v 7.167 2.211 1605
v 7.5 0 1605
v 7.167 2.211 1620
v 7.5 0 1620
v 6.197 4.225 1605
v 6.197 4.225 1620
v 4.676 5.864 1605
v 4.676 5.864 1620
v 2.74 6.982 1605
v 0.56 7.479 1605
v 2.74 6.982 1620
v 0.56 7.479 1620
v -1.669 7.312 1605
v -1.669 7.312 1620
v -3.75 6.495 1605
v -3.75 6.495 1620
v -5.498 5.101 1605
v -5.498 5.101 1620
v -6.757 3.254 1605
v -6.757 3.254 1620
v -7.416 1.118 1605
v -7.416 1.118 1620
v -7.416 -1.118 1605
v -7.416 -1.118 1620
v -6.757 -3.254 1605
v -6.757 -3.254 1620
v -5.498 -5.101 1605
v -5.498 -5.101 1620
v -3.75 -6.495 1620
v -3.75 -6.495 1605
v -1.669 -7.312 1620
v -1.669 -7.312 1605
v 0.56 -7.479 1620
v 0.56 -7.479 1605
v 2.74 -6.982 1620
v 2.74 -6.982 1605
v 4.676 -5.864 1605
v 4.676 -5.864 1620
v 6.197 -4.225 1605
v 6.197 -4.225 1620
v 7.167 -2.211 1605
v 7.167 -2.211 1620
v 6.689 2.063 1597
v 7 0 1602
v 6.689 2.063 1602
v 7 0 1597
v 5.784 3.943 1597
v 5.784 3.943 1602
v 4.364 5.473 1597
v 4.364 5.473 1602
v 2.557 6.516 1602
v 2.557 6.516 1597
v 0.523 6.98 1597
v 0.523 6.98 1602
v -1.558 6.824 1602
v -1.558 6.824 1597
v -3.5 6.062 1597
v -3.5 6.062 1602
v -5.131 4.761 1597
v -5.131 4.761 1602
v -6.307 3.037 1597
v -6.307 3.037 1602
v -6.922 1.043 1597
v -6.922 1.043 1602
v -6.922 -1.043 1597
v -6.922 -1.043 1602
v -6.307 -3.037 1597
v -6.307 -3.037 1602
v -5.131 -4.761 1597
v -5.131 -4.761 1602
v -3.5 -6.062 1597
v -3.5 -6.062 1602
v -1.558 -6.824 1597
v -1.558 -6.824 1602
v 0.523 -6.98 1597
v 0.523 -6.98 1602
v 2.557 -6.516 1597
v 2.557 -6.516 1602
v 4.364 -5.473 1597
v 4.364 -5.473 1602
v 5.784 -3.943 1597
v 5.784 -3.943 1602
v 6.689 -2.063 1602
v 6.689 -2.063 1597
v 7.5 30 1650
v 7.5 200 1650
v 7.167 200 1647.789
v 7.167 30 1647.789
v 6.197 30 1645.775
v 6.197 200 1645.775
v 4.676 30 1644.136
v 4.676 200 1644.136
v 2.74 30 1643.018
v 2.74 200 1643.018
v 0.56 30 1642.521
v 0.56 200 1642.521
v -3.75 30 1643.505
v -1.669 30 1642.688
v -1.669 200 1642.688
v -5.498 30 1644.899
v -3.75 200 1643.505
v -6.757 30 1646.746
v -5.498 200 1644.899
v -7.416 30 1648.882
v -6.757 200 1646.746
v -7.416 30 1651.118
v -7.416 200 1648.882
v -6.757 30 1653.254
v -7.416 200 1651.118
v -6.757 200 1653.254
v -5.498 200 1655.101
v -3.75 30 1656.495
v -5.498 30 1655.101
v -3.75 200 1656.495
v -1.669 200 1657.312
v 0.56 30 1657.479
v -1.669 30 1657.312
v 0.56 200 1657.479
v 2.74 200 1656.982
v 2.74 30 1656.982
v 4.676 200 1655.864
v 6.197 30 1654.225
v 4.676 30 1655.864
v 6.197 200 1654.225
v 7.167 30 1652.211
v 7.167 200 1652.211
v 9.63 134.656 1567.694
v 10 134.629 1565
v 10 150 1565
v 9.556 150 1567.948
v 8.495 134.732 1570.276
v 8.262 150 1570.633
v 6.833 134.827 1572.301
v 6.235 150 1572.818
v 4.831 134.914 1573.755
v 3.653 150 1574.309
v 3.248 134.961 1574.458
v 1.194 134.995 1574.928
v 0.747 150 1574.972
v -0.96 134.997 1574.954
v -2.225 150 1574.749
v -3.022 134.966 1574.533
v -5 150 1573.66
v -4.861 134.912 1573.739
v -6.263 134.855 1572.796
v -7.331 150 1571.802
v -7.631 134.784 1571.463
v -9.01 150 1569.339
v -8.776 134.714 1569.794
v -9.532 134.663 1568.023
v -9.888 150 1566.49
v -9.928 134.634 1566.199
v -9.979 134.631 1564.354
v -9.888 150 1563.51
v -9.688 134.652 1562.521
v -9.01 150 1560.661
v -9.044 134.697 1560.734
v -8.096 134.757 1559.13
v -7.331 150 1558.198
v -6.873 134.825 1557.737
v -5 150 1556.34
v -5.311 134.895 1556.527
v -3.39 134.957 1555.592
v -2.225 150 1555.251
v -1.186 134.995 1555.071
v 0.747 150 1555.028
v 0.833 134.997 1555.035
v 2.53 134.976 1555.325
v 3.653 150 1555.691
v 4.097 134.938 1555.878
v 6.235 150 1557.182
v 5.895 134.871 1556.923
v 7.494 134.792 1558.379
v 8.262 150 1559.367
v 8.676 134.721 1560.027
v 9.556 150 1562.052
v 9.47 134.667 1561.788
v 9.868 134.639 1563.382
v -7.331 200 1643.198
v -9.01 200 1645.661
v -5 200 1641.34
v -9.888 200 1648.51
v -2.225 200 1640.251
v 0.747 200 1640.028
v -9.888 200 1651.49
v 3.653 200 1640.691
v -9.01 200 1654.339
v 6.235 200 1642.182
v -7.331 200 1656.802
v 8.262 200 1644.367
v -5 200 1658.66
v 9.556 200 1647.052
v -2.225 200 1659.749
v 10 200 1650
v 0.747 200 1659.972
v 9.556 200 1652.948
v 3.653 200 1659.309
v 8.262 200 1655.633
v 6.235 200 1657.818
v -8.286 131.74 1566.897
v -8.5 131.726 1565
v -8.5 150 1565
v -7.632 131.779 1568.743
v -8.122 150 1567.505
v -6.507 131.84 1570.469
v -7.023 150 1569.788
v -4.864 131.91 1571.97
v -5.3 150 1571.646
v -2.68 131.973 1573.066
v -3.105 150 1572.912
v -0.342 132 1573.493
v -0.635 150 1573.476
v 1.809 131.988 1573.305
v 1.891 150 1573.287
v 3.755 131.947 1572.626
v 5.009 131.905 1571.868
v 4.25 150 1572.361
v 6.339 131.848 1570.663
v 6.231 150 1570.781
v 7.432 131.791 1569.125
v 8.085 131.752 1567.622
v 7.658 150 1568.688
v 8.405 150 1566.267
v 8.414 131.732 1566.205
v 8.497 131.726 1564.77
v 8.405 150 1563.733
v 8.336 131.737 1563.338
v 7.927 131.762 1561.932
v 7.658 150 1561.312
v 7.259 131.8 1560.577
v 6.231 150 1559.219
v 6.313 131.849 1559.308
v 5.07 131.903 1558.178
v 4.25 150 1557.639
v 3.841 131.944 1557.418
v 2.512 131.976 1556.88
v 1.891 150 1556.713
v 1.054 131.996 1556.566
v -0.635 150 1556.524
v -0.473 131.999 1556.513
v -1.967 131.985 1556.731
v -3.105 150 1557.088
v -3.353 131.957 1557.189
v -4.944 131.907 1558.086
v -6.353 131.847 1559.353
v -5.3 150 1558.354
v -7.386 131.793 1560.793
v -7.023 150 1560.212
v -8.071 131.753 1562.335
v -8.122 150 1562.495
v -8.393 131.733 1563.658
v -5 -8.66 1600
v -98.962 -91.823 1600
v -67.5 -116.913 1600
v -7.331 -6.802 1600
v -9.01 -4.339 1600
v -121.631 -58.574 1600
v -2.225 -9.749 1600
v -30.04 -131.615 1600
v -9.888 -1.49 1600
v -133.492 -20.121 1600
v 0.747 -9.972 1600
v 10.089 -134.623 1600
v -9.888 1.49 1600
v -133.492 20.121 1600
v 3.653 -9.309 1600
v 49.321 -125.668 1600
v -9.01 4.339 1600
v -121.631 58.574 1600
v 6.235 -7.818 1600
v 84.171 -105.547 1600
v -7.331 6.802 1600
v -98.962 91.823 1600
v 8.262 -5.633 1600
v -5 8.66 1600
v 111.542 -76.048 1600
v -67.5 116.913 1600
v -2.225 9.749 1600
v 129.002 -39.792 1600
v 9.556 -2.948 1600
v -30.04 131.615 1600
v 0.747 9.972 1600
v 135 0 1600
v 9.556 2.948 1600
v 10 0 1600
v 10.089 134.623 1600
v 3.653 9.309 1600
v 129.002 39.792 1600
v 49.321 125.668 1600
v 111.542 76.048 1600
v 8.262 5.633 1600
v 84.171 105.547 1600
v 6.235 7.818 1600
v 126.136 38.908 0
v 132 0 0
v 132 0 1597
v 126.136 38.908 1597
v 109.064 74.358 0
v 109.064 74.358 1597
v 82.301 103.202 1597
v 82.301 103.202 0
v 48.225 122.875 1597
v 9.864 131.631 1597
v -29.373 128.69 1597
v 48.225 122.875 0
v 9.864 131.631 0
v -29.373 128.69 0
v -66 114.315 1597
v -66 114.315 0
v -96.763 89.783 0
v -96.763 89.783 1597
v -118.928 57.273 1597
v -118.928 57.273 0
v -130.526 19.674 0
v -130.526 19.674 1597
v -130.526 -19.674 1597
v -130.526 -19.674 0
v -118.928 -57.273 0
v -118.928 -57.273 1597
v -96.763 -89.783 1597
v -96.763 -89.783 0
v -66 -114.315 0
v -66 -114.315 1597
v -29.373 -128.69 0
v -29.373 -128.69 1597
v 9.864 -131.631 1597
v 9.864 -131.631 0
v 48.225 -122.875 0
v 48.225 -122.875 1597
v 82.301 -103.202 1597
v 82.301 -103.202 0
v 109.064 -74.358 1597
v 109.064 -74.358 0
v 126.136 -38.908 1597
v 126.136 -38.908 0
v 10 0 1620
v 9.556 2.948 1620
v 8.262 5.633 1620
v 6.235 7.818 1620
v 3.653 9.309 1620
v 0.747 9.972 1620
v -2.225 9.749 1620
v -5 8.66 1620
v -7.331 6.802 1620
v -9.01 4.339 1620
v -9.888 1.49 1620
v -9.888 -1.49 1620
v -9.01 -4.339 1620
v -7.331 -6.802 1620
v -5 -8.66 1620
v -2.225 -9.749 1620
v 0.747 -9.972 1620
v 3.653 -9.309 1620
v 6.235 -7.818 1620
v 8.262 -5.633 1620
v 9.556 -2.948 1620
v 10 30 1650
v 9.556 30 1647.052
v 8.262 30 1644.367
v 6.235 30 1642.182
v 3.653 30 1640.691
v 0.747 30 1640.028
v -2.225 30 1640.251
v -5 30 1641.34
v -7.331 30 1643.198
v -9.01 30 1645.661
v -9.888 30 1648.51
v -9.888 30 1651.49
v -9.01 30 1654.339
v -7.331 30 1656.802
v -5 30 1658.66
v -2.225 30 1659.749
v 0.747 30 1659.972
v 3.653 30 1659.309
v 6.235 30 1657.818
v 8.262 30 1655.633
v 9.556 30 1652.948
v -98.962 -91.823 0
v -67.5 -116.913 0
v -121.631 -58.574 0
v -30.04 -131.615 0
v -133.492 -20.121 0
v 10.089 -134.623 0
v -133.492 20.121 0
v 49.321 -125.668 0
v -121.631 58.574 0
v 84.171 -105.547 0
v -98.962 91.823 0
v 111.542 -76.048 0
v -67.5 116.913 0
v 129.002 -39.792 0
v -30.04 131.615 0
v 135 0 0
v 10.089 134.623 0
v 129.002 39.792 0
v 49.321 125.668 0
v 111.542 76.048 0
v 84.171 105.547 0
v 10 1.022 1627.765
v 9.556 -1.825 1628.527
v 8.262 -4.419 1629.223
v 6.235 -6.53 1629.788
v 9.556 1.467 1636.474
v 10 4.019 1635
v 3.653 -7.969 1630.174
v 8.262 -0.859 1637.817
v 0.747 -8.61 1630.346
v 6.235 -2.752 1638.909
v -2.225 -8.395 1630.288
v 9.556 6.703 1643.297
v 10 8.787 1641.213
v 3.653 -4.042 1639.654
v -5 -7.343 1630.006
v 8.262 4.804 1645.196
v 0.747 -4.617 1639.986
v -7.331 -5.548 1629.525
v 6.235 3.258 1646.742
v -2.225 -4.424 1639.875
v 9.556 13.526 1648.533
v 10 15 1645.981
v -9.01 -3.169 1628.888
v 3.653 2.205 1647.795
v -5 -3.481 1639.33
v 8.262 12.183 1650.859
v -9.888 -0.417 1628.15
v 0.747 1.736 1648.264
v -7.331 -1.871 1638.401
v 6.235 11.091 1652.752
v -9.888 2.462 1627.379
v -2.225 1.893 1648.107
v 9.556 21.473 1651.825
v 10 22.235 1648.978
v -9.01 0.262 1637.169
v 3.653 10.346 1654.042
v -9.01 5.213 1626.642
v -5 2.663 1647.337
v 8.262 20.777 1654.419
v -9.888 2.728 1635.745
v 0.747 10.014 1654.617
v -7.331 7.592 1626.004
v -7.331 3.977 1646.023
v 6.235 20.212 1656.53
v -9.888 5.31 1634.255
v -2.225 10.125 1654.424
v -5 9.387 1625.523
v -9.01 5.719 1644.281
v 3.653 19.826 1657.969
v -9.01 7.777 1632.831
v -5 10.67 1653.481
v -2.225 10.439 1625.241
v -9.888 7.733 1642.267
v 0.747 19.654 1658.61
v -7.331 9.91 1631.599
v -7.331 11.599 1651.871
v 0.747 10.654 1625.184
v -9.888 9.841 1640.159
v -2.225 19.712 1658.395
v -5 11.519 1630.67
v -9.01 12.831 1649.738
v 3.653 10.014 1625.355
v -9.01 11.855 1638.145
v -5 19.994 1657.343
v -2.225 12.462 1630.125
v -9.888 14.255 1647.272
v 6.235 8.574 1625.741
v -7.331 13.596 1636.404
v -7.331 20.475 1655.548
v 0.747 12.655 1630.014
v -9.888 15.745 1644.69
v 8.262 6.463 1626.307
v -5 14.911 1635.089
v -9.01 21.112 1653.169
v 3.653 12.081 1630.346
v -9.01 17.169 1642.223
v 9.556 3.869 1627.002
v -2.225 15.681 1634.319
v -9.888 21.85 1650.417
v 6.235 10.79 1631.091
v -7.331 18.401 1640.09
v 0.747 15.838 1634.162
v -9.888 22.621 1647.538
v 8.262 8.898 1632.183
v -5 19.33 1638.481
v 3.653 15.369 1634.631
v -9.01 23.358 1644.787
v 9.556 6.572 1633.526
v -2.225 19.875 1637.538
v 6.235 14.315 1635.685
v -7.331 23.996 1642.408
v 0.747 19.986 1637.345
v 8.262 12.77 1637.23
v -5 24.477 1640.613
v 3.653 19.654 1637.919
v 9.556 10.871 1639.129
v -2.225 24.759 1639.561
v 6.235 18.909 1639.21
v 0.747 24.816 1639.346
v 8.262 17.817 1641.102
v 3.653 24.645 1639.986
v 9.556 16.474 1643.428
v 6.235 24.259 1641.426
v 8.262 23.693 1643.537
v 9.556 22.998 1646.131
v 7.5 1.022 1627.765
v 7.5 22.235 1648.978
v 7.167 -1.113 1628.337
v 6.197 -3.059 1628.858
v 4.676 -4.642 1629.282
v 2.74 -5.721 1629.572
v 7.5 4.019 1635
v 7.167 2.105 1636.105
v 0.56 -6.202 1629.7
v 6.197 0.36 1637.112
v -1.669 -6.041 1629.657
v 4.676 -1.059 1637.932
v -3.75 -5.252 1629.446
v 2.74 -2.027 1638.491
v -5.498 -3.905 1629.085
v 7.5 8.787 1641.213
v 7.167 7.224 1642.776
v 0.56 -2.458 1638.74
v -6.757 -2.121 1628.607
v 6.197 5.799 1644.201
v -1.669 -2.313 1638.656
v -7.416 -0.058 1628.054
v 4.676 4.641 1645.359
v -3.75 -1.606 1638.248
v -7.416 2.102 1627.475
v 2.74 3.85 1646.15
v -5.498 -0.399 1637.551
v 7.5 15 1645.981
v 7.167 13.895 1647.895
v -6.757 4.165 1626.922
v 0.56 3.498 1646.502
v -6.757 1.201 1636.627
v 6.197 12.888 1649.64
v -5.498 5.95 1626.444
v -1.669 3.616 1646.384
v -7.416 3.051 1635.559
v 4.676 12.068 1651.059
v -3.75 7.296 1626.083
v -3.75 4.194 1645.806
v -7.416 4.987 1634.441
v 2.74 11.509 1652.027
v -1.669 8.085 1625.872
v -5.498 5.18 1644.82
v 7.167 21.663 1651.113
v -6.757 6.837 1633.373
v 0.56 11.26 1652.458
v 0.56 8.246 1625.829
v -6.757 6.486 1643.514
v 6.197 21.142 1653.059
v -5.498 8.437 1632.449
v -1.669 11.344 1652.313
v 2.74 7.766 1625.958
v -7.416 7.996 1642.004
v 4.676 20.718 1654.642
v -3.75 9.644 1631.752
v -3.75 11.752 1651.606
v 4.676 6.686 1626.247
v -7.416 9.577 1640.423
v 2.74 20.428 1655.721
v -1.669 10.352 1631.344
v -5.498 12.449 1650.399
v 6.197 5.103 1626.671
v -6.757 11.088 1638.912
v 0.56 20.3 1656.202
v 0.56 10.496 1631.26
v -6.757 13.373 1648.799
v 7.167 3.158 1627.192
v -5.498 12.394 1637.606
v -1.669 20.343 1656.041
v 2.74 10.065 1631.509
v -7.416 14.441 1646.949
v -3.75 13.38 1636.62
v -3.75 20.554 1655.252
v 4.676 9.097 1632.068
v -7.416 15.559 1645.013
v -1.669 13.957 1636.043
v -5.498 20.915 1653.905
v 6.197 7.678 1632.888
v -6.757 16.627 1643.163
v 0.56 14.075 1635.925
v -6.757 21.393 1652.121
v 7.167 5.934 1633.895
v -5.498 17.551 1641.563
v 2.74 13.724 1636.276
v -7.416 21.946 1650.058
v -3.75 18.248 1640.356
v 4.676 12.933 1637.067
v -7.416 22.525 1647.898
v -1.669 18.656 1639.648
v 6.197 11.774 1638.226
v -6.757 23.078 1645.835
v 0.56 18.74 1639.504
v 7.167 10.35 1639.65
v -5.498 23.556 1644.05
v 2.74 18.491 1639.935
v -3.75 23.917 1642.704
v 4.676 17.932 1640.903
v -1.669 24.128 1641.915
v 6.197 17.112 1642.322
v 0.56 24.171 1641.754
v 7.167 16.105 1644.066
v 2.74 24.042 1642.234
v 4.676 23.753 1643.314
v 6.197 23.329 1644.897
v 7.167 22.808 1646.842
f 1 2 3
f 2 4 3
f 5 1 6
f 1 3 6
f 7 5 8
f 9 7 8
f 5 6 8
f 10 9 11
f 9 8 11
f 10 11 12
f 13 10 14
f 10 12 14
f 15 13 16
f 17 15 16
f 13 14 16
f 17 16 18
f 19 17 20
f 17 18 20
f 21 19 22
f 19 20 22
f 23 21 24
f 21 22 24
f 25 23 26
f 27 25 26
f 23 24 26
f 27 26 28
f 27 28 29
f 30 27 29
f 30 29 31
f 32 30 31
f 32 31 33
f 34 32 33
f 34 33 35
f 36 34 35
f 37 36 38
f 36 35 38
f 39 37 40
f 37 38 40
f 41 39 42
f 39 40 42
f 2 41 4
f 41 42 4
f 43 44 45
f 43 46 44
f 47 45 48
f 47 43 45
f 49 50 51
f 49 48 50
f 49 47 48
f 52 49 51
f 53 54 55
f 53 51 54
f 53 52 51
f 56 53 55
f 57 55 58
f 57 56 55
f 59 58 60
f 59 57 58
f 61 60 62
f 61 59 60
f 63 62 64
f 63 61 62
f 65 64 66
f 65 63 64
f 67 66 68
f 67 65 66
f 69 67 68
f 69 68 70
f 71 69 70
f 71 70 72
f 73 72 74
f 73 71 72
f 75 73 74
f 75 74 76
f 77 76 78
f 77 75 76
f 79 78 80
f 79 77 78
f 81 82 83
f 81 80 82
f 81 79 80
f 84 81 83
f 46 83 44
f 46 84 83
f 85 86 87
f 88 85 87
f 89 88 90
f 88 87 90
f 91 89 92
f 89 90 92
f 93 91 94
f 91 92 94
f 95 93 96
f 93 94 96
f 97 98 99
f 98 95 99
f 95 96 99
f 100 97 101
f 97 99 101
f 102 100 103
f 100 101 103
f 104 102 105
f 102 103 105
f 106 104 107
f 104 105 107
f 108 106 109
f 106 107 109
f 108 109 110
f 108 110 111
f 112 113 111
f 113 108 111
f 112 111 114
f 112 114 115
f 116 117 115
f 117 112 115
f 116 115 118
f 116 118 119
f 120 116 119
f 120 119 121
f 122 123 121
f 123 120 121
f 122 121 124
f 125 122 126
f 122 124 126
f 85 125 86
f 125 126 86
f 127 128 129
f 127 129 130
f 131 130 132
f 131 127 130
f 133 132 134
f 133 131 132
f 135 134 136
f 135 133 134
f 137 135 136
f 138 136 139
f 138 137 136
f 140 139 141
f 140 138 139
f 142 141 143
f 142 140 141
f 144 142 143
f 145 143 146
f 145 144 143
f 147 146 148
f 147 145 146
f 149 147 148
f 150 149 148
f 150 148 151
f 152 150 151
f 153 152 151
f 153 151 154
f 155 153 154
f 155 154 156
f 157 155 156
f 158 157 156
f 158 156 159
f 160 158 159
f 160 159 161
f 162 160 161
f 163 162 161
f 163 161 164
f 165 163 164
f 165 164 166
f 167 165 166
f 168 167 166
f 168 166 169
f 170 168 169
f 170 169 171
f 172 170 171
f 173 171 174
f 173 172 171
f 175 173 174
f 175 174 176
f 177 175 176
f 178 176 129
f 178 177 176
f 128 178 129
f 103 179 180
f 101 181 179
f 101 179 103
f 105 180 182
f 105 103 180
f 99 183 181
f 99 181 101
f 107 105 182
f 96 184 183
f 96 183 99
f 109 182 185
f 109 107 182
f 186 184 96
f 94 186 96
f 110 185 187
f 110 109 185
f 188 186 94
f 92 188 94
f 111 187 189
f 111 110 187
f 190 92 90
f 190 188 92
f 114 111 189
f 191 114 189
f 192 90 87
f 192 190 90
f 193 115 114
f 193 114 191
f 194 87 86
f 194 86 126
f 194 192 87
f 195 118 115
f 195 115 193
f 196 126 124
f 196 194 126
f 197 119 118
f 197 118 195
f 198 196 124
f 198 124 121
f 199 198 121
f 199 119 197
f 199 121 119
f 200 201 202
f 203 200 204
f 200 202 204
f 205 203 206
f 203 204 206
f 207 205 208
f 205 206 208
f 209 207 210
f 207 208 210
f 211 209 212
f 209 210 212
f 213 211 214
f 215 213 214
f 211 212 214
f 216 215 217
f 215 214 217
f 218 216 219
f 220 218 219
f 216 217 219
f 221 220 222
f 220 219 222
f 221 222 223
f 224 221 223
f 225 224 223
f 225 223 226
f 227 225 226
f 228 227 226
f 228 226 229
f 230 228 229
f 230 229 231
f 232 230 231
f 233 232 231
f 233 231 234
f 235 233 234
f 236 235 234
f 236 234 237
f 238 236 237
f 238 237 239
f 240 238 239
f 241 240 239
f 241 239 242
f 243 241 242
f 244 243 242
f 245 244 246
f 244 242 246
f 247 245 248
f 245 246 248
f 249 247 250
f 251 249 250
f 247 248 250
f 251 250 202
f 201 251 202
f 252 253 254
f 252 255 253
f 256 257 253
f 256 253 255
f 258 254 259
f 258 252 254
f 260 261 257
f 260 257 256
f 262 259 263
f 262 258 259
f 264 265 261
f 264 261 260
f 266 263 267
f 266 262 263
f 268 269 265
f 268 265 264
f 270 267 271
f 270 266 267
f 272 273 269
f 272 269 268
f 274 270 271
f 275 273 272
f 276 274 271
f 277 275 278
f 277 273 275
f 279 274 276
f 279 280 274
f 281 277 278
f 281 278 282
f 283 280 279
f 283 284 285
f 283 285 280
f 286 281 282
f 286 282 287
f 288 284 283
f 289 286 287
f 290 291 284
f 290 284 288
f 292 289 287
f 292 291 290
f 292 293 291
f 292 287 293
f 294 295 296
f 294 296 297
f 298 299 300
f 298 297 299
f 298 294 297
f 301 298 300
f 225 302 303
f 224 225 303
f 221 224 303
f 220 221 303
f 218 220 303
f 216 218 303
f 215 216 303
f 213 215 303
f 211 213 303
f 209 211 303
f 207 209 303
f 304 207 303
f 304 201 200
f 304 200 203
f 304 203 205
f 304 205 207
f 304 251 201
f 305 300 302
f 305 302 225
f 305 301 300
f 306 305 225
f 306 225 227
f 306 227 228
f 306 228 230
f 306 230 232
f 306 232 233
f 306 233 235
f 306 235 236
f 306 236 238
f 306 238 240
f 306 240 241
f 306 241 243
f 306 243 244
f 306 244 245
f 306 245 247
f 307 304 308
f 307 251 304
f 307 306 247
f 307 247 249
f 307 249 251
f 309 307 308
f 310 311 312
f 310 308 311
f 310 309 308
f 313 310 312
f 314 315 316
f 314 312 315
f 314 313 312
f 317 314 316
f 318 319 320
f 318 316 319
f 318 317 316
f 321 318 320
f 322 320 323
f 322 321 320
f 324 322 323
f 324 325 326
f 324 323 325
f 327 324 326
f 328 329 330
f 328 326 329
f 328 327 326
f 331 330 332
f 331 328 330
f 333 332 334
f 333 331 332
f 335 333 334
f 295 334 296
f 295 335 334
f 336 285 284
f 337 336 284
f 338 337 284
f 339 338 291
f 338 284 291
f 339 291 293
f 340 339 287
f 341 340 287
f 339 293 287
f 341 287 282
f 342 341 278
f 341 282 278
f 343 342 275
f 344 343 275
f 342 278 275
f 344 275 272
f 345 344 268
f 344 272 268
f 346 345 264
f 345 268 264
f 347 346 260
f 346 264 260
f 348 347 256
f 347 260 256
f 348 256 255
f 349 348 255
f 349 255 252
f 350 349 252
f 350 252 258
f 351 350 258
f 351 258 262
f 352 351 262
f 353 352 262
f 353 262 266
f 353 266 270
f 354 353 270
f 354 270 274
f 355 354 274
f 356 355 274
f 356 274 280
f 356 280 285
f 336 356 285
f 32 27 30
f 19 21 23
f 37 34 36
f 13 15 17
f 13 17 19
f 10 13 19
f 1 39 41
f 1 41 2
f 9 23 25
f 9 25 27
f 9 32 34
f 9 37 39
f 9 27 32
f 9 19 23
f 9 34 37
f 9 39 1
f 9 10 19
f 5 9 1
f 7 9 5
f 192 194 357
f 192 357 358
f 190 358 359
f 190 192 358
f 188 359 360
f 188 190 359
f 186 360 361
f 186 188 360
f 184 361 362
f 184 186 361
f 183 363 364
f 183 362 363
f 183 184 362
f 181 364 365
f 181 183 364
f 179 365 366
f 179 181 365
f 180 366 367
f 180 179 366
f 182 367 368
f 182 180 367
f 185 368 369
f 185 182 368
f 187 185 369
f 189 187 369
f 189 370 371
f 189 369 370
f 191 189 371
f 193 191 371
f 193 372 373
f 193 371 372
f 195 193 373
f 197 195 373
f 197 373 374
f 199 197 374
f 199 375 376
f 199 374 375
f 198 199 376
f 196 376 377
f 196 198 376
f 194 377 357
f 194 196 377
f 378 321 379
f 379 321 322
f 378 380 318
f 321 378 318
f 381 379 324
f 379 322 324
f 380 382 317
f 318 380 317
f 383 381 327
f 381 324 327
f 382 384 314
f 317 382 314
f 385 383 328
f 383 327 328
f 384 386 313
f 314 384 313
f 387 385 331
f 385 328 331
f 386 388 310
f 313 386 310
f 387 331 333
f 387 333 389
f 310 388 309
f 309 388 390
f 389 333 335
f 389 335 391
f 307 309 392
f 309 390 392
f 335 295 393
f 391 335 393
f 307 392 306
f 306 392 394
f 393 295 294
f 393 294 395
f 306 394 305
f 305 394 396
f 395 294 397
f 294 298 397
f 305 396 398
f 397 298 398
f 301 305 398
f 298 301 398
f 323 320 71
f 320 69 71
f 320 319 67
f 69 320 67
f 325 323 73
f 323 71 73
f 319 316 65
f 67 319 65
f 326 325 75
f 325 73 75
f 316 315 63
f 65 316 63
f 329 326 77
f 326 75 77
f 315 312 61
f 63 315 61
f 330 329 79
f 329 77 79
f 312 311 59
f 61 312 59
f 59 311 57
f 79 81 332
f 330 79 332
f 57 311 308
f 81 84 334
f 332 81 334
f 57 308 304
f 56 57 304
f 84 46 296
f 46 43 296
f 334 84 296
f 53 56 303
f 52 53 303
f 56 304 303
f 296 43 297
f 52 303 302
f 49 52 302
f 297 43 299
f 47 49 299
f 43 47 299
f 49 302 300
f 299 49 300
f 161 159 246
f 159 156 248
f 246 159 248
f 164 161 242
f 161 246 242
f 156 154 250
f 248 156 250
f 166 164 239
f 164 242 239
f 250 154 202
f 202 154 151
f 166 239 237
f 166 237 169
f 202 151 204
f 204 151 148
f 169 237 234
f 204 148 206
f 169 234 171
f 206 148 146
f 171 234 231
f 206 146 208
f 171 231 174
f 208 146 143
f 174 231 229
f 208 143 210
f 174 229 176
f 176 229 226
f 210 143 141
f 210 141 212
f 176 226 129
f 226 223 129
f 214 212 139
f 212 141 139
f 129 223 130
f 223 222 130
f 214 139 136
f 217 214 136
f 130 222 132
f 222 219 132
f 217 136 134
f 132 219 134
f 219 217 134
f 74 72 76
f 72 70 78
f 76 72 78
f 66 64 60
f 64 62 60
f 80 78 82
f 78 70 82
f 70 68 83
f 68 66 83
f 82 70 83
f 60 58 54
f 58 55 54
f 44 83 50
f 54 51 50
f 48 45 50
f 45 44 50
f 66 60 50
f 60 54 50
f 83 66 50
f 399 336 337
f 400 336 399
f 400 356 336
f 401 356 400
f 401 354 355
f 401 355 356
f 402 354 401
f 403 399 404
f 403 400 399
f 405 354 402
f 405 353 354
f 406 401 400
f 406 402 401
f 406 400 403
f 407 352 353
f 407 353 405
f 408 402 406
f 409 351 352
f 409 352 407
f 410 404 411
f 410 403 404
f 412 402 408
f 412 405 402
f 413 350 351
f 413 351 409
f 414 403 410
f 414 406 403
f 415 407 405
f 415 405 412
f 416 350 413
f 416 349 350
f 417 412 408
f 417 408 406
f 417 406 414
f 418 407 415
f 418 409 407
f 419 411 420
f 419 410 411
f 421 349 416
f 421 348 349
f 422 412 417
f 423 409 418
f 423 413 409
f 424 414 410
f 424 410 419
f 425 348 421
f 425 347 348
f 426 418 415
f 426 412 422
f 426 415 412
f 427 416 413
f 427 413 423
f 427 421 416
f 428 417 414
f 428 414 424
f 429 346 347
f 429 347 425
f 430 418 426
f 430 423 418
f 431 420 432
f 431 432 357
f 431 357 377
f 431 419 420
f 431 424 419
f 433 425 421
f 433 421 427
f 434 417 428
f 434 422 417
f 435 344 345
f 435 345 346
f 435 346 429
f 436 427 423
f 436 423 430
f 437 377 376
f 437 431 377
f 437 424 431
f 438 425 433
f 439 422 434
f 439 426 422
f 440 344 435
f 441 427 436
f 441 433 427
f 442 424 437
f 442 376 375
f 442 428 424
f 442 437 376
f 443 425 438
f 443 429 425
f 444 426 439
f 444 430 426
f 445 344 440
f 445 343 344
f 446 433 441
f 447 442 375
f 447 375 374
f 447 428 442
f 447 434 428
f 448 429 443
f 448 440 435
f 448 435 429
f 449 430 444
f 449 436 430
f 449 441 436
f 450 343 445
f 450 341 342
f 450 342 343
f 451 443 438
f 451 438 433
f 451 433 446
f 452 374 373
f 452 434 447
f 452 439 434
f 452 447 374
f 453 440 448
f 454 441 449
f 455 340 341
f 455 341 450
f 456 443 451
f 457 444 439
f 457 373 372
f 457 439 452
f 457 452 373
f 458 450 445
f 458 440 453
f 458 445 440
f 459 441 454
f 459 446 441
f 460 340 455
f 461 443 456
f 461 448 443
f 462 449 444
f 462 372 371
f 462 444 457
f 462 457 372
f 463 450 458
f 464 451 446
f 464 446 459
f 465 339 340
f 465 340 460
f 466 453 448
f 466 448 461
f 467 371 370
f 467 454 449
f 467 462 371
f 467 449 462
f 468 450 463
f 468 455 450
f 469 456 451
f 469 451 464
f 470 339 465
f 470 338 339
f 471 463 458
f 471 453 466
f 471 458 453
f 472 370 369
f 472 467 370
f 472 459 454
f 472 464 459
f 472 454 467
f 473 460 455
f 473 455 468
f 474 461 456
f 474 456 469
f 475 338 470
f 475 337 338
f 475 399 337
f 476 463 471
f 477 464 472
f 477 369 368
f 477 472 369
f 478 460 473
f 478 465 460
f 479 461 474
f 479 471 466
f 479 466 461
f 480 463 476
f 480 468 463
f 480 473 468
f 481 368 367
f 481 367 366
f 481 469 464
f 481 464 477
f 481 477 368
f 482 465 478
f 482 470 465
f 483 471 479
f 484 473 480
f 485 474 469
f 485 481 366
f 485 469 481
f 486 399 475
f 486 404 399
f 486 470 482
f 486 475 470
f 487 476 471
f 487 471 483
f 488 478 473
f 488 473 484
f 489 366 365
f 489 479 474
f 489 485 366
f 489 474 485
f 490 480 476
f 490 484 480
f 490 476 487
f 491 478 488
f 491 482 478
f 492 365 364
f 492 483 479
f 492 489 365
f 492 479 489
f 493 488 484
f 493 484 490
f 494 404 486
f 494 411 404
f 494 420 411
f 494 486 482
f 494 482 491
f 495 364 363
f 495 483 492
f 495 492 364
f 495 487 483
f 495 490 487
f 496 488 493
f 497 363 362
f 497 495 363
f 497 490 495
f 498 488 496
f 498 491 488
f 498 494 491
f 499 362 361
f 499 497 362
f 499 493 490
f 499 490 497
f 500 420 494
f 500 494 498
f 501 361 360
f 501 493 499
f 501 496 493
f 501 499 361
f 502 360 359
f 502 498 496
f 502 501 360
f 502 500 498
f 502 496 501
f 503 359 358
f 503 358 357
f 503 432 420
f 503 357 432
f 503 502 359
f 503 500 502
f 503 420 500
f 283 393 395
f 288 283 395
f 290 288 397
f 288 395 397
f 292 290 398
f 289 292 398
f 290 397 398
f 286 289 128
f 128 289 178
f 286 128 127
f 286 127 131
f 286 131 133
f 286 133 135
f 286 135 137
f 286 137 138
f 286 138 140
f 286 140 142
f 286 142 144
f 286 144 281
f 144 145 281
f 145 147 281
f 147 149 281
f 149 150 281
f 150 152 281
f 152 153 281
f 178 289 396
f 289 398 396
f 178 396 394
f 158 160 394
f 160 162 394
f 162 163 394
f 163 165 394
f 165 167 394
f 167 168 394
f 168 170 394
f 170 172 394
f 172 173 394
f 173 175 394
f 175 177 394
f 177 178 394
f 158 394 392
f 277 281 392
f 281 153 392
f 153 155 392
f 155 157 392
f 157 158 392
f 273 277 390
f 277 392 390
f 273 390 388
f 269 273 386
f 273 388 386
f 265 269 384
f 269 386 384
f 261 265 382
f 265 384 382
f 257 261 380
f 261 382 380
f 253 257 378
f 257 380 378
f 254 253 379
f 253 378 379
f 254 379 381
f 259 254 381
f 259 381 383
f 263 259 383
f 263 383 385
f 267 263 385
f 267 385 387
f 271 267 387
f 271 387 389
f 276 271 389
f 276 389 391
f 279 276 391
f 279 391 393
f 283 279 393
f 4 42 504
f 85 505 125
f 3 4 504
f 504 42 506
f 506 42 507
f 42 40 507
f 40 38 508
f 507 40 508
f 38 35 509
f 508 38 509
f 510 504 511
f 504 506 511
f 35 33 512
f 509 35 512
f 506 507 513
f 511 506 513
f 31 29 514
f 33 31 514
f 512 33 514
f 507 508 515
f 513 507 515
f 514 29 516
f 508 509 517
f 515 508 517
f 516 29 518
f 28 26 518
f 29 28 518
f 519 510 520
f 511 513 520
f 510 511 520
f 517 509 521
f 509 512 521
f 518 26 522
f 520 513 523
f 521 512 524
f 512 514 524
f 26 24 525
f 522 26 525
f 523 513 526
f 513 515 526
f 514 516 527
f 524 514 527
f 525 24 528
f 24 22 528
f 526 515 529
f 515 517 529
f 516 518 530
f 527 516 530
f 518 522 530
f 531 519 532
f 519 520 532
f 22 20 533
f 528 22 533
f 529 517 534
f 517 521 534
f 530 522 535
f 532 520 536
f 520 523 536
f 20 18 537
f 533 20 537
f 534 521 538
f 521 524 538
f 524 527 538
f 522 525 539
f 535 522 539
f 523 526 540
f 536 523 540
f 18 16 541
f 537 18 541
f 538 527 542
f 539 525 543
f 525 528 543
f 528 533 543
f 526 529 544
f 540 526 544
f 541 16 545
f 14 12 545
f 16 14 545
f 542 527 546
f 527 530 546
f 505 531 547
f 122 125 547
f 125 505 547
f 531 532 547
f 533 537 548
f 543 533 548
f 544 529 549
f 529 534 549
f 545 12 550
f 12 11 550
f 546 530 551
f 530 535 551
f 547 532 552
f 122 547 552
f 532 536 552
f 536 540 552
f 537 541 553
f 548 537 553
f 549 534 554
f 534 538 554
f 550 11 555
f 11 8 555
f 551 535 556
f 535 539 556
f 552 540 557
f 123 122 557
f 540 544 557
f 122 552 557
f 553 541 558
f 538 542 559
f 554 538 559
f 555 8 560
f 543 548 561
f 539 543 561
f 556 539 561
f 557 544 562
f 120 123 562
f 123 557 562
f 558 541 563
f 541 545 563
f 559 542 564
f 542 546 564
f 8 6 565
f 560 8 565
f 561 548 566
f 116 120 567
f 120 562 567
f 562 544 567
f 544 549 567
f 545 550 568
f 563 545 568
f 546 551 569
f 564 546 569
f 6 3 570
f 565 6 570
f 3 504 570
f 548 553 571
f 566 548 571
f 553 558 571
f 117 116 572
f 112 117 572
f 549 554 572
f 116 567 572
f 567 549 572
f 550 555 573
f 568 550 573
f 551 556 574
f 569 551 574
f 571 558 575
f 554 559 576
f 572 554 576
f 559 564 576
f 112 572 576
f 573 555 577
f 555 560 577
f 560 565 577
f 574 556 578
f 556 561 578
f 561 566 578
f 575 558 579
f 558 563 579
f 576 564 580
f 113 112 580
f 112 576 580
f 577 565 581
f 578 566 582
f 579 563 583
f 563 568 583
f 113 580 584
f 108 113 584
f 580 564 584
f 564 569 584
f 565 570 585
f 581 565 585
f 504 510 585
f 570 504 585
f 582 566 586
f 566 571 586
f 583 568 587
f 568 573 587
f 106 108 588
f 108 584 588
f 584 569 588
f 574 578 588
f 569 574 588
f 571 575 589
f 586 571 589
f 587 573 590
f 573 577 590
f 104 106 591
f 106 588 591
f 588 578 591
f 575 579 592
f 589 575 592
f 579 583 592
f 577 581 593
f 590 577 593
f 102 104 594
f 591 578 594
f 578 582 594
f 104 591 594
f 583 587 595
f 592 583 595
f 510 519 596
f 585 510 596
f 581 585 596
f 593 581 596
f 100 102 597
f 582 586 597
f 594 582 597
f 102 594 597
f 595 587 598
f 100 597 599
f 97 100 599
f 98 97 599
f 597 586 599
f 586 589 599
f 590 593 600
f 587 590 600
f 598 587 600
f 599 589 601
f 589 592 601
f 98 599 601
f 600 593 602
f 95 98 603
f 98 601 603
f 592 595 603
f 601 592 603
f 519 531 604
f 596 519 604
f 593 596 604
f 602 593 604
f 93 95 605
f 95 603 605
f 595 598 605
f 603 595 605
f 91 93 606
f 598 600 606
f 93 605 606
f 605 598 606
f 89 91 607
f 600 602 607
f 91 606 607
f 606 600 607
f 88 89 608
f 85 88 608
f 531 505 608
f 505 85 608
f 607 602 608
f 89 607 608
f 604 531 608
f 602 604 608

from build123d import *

# Parameters (mm, degrees)
F0_R      = 135
F1_DEPTH  = 1600
F2_R      = 10
F6_DEPTH  = 5
F5_R      = 10
F7_DEPTH  = 25
F8_T      = -3
F9_R      = 8.5
F10_DEPTH = 50
F11_R     = 10
F11_R_2   = 7.5


with BuildPart() as f1:
    # F0 (on Top) → F1 (new body)
    with BuildSketch(Plane.XY):
        Circle(F0_R)
    extrude(amount=F1_DEPTH)

    # F2 (on face) → F6 (join)
    with BuildSketch(Plane.XY.offset(1600)):
        Circle(F2_R)
    extrude(amount=F6_DEPTH)

    # F5 (on offset) → F7 (join)
    with BuildSketch(Plane.XZ.offset(-125)):
        with Locations((0, 1565)):
            Circle(F5_R)
    extrude(amount=-F7_DEPTH)

    # F8
    f8_openings = [f1.faces().sort_by_distance(p)[0] for p in [
        (0, 0, 0),
    ]]
    offset(amount=F8_T, openings=f8_openings, kind=Kind.INTERSECTION)

    # F9 (on face) → F10 (cut)
    with BuildSketch(Plane(origin=(0, 150, 0), x_dir=(-1, 0, 0), z_dir=(0, 1, 0))):
        with Locations((0, 1565)):
            Circle(F9_R)
    extrude(amount=-F10_DEPTH, mode=Mode.SUBTRACT)

    # F12: sweep along a path in F3
    with BuildLine(Plane.YZ) as f12_path:
        Line((0, 1600), (0, 1620))
        ThreePointArc((0, 1620), (8.7867965644, 1641.2132034356), (30, 1650))
        Line((30, 1650), (200, 1650))
    # F11 (on face) → F12 (sweep)
    with BuildSketch(Plane.XY.offset(1605)):
        Circle(F11_R)
        Circle(F11_R_2, mode=Mode.SUBTRACT)
    sweep(path=f12_path.line)


solid = f1.part
